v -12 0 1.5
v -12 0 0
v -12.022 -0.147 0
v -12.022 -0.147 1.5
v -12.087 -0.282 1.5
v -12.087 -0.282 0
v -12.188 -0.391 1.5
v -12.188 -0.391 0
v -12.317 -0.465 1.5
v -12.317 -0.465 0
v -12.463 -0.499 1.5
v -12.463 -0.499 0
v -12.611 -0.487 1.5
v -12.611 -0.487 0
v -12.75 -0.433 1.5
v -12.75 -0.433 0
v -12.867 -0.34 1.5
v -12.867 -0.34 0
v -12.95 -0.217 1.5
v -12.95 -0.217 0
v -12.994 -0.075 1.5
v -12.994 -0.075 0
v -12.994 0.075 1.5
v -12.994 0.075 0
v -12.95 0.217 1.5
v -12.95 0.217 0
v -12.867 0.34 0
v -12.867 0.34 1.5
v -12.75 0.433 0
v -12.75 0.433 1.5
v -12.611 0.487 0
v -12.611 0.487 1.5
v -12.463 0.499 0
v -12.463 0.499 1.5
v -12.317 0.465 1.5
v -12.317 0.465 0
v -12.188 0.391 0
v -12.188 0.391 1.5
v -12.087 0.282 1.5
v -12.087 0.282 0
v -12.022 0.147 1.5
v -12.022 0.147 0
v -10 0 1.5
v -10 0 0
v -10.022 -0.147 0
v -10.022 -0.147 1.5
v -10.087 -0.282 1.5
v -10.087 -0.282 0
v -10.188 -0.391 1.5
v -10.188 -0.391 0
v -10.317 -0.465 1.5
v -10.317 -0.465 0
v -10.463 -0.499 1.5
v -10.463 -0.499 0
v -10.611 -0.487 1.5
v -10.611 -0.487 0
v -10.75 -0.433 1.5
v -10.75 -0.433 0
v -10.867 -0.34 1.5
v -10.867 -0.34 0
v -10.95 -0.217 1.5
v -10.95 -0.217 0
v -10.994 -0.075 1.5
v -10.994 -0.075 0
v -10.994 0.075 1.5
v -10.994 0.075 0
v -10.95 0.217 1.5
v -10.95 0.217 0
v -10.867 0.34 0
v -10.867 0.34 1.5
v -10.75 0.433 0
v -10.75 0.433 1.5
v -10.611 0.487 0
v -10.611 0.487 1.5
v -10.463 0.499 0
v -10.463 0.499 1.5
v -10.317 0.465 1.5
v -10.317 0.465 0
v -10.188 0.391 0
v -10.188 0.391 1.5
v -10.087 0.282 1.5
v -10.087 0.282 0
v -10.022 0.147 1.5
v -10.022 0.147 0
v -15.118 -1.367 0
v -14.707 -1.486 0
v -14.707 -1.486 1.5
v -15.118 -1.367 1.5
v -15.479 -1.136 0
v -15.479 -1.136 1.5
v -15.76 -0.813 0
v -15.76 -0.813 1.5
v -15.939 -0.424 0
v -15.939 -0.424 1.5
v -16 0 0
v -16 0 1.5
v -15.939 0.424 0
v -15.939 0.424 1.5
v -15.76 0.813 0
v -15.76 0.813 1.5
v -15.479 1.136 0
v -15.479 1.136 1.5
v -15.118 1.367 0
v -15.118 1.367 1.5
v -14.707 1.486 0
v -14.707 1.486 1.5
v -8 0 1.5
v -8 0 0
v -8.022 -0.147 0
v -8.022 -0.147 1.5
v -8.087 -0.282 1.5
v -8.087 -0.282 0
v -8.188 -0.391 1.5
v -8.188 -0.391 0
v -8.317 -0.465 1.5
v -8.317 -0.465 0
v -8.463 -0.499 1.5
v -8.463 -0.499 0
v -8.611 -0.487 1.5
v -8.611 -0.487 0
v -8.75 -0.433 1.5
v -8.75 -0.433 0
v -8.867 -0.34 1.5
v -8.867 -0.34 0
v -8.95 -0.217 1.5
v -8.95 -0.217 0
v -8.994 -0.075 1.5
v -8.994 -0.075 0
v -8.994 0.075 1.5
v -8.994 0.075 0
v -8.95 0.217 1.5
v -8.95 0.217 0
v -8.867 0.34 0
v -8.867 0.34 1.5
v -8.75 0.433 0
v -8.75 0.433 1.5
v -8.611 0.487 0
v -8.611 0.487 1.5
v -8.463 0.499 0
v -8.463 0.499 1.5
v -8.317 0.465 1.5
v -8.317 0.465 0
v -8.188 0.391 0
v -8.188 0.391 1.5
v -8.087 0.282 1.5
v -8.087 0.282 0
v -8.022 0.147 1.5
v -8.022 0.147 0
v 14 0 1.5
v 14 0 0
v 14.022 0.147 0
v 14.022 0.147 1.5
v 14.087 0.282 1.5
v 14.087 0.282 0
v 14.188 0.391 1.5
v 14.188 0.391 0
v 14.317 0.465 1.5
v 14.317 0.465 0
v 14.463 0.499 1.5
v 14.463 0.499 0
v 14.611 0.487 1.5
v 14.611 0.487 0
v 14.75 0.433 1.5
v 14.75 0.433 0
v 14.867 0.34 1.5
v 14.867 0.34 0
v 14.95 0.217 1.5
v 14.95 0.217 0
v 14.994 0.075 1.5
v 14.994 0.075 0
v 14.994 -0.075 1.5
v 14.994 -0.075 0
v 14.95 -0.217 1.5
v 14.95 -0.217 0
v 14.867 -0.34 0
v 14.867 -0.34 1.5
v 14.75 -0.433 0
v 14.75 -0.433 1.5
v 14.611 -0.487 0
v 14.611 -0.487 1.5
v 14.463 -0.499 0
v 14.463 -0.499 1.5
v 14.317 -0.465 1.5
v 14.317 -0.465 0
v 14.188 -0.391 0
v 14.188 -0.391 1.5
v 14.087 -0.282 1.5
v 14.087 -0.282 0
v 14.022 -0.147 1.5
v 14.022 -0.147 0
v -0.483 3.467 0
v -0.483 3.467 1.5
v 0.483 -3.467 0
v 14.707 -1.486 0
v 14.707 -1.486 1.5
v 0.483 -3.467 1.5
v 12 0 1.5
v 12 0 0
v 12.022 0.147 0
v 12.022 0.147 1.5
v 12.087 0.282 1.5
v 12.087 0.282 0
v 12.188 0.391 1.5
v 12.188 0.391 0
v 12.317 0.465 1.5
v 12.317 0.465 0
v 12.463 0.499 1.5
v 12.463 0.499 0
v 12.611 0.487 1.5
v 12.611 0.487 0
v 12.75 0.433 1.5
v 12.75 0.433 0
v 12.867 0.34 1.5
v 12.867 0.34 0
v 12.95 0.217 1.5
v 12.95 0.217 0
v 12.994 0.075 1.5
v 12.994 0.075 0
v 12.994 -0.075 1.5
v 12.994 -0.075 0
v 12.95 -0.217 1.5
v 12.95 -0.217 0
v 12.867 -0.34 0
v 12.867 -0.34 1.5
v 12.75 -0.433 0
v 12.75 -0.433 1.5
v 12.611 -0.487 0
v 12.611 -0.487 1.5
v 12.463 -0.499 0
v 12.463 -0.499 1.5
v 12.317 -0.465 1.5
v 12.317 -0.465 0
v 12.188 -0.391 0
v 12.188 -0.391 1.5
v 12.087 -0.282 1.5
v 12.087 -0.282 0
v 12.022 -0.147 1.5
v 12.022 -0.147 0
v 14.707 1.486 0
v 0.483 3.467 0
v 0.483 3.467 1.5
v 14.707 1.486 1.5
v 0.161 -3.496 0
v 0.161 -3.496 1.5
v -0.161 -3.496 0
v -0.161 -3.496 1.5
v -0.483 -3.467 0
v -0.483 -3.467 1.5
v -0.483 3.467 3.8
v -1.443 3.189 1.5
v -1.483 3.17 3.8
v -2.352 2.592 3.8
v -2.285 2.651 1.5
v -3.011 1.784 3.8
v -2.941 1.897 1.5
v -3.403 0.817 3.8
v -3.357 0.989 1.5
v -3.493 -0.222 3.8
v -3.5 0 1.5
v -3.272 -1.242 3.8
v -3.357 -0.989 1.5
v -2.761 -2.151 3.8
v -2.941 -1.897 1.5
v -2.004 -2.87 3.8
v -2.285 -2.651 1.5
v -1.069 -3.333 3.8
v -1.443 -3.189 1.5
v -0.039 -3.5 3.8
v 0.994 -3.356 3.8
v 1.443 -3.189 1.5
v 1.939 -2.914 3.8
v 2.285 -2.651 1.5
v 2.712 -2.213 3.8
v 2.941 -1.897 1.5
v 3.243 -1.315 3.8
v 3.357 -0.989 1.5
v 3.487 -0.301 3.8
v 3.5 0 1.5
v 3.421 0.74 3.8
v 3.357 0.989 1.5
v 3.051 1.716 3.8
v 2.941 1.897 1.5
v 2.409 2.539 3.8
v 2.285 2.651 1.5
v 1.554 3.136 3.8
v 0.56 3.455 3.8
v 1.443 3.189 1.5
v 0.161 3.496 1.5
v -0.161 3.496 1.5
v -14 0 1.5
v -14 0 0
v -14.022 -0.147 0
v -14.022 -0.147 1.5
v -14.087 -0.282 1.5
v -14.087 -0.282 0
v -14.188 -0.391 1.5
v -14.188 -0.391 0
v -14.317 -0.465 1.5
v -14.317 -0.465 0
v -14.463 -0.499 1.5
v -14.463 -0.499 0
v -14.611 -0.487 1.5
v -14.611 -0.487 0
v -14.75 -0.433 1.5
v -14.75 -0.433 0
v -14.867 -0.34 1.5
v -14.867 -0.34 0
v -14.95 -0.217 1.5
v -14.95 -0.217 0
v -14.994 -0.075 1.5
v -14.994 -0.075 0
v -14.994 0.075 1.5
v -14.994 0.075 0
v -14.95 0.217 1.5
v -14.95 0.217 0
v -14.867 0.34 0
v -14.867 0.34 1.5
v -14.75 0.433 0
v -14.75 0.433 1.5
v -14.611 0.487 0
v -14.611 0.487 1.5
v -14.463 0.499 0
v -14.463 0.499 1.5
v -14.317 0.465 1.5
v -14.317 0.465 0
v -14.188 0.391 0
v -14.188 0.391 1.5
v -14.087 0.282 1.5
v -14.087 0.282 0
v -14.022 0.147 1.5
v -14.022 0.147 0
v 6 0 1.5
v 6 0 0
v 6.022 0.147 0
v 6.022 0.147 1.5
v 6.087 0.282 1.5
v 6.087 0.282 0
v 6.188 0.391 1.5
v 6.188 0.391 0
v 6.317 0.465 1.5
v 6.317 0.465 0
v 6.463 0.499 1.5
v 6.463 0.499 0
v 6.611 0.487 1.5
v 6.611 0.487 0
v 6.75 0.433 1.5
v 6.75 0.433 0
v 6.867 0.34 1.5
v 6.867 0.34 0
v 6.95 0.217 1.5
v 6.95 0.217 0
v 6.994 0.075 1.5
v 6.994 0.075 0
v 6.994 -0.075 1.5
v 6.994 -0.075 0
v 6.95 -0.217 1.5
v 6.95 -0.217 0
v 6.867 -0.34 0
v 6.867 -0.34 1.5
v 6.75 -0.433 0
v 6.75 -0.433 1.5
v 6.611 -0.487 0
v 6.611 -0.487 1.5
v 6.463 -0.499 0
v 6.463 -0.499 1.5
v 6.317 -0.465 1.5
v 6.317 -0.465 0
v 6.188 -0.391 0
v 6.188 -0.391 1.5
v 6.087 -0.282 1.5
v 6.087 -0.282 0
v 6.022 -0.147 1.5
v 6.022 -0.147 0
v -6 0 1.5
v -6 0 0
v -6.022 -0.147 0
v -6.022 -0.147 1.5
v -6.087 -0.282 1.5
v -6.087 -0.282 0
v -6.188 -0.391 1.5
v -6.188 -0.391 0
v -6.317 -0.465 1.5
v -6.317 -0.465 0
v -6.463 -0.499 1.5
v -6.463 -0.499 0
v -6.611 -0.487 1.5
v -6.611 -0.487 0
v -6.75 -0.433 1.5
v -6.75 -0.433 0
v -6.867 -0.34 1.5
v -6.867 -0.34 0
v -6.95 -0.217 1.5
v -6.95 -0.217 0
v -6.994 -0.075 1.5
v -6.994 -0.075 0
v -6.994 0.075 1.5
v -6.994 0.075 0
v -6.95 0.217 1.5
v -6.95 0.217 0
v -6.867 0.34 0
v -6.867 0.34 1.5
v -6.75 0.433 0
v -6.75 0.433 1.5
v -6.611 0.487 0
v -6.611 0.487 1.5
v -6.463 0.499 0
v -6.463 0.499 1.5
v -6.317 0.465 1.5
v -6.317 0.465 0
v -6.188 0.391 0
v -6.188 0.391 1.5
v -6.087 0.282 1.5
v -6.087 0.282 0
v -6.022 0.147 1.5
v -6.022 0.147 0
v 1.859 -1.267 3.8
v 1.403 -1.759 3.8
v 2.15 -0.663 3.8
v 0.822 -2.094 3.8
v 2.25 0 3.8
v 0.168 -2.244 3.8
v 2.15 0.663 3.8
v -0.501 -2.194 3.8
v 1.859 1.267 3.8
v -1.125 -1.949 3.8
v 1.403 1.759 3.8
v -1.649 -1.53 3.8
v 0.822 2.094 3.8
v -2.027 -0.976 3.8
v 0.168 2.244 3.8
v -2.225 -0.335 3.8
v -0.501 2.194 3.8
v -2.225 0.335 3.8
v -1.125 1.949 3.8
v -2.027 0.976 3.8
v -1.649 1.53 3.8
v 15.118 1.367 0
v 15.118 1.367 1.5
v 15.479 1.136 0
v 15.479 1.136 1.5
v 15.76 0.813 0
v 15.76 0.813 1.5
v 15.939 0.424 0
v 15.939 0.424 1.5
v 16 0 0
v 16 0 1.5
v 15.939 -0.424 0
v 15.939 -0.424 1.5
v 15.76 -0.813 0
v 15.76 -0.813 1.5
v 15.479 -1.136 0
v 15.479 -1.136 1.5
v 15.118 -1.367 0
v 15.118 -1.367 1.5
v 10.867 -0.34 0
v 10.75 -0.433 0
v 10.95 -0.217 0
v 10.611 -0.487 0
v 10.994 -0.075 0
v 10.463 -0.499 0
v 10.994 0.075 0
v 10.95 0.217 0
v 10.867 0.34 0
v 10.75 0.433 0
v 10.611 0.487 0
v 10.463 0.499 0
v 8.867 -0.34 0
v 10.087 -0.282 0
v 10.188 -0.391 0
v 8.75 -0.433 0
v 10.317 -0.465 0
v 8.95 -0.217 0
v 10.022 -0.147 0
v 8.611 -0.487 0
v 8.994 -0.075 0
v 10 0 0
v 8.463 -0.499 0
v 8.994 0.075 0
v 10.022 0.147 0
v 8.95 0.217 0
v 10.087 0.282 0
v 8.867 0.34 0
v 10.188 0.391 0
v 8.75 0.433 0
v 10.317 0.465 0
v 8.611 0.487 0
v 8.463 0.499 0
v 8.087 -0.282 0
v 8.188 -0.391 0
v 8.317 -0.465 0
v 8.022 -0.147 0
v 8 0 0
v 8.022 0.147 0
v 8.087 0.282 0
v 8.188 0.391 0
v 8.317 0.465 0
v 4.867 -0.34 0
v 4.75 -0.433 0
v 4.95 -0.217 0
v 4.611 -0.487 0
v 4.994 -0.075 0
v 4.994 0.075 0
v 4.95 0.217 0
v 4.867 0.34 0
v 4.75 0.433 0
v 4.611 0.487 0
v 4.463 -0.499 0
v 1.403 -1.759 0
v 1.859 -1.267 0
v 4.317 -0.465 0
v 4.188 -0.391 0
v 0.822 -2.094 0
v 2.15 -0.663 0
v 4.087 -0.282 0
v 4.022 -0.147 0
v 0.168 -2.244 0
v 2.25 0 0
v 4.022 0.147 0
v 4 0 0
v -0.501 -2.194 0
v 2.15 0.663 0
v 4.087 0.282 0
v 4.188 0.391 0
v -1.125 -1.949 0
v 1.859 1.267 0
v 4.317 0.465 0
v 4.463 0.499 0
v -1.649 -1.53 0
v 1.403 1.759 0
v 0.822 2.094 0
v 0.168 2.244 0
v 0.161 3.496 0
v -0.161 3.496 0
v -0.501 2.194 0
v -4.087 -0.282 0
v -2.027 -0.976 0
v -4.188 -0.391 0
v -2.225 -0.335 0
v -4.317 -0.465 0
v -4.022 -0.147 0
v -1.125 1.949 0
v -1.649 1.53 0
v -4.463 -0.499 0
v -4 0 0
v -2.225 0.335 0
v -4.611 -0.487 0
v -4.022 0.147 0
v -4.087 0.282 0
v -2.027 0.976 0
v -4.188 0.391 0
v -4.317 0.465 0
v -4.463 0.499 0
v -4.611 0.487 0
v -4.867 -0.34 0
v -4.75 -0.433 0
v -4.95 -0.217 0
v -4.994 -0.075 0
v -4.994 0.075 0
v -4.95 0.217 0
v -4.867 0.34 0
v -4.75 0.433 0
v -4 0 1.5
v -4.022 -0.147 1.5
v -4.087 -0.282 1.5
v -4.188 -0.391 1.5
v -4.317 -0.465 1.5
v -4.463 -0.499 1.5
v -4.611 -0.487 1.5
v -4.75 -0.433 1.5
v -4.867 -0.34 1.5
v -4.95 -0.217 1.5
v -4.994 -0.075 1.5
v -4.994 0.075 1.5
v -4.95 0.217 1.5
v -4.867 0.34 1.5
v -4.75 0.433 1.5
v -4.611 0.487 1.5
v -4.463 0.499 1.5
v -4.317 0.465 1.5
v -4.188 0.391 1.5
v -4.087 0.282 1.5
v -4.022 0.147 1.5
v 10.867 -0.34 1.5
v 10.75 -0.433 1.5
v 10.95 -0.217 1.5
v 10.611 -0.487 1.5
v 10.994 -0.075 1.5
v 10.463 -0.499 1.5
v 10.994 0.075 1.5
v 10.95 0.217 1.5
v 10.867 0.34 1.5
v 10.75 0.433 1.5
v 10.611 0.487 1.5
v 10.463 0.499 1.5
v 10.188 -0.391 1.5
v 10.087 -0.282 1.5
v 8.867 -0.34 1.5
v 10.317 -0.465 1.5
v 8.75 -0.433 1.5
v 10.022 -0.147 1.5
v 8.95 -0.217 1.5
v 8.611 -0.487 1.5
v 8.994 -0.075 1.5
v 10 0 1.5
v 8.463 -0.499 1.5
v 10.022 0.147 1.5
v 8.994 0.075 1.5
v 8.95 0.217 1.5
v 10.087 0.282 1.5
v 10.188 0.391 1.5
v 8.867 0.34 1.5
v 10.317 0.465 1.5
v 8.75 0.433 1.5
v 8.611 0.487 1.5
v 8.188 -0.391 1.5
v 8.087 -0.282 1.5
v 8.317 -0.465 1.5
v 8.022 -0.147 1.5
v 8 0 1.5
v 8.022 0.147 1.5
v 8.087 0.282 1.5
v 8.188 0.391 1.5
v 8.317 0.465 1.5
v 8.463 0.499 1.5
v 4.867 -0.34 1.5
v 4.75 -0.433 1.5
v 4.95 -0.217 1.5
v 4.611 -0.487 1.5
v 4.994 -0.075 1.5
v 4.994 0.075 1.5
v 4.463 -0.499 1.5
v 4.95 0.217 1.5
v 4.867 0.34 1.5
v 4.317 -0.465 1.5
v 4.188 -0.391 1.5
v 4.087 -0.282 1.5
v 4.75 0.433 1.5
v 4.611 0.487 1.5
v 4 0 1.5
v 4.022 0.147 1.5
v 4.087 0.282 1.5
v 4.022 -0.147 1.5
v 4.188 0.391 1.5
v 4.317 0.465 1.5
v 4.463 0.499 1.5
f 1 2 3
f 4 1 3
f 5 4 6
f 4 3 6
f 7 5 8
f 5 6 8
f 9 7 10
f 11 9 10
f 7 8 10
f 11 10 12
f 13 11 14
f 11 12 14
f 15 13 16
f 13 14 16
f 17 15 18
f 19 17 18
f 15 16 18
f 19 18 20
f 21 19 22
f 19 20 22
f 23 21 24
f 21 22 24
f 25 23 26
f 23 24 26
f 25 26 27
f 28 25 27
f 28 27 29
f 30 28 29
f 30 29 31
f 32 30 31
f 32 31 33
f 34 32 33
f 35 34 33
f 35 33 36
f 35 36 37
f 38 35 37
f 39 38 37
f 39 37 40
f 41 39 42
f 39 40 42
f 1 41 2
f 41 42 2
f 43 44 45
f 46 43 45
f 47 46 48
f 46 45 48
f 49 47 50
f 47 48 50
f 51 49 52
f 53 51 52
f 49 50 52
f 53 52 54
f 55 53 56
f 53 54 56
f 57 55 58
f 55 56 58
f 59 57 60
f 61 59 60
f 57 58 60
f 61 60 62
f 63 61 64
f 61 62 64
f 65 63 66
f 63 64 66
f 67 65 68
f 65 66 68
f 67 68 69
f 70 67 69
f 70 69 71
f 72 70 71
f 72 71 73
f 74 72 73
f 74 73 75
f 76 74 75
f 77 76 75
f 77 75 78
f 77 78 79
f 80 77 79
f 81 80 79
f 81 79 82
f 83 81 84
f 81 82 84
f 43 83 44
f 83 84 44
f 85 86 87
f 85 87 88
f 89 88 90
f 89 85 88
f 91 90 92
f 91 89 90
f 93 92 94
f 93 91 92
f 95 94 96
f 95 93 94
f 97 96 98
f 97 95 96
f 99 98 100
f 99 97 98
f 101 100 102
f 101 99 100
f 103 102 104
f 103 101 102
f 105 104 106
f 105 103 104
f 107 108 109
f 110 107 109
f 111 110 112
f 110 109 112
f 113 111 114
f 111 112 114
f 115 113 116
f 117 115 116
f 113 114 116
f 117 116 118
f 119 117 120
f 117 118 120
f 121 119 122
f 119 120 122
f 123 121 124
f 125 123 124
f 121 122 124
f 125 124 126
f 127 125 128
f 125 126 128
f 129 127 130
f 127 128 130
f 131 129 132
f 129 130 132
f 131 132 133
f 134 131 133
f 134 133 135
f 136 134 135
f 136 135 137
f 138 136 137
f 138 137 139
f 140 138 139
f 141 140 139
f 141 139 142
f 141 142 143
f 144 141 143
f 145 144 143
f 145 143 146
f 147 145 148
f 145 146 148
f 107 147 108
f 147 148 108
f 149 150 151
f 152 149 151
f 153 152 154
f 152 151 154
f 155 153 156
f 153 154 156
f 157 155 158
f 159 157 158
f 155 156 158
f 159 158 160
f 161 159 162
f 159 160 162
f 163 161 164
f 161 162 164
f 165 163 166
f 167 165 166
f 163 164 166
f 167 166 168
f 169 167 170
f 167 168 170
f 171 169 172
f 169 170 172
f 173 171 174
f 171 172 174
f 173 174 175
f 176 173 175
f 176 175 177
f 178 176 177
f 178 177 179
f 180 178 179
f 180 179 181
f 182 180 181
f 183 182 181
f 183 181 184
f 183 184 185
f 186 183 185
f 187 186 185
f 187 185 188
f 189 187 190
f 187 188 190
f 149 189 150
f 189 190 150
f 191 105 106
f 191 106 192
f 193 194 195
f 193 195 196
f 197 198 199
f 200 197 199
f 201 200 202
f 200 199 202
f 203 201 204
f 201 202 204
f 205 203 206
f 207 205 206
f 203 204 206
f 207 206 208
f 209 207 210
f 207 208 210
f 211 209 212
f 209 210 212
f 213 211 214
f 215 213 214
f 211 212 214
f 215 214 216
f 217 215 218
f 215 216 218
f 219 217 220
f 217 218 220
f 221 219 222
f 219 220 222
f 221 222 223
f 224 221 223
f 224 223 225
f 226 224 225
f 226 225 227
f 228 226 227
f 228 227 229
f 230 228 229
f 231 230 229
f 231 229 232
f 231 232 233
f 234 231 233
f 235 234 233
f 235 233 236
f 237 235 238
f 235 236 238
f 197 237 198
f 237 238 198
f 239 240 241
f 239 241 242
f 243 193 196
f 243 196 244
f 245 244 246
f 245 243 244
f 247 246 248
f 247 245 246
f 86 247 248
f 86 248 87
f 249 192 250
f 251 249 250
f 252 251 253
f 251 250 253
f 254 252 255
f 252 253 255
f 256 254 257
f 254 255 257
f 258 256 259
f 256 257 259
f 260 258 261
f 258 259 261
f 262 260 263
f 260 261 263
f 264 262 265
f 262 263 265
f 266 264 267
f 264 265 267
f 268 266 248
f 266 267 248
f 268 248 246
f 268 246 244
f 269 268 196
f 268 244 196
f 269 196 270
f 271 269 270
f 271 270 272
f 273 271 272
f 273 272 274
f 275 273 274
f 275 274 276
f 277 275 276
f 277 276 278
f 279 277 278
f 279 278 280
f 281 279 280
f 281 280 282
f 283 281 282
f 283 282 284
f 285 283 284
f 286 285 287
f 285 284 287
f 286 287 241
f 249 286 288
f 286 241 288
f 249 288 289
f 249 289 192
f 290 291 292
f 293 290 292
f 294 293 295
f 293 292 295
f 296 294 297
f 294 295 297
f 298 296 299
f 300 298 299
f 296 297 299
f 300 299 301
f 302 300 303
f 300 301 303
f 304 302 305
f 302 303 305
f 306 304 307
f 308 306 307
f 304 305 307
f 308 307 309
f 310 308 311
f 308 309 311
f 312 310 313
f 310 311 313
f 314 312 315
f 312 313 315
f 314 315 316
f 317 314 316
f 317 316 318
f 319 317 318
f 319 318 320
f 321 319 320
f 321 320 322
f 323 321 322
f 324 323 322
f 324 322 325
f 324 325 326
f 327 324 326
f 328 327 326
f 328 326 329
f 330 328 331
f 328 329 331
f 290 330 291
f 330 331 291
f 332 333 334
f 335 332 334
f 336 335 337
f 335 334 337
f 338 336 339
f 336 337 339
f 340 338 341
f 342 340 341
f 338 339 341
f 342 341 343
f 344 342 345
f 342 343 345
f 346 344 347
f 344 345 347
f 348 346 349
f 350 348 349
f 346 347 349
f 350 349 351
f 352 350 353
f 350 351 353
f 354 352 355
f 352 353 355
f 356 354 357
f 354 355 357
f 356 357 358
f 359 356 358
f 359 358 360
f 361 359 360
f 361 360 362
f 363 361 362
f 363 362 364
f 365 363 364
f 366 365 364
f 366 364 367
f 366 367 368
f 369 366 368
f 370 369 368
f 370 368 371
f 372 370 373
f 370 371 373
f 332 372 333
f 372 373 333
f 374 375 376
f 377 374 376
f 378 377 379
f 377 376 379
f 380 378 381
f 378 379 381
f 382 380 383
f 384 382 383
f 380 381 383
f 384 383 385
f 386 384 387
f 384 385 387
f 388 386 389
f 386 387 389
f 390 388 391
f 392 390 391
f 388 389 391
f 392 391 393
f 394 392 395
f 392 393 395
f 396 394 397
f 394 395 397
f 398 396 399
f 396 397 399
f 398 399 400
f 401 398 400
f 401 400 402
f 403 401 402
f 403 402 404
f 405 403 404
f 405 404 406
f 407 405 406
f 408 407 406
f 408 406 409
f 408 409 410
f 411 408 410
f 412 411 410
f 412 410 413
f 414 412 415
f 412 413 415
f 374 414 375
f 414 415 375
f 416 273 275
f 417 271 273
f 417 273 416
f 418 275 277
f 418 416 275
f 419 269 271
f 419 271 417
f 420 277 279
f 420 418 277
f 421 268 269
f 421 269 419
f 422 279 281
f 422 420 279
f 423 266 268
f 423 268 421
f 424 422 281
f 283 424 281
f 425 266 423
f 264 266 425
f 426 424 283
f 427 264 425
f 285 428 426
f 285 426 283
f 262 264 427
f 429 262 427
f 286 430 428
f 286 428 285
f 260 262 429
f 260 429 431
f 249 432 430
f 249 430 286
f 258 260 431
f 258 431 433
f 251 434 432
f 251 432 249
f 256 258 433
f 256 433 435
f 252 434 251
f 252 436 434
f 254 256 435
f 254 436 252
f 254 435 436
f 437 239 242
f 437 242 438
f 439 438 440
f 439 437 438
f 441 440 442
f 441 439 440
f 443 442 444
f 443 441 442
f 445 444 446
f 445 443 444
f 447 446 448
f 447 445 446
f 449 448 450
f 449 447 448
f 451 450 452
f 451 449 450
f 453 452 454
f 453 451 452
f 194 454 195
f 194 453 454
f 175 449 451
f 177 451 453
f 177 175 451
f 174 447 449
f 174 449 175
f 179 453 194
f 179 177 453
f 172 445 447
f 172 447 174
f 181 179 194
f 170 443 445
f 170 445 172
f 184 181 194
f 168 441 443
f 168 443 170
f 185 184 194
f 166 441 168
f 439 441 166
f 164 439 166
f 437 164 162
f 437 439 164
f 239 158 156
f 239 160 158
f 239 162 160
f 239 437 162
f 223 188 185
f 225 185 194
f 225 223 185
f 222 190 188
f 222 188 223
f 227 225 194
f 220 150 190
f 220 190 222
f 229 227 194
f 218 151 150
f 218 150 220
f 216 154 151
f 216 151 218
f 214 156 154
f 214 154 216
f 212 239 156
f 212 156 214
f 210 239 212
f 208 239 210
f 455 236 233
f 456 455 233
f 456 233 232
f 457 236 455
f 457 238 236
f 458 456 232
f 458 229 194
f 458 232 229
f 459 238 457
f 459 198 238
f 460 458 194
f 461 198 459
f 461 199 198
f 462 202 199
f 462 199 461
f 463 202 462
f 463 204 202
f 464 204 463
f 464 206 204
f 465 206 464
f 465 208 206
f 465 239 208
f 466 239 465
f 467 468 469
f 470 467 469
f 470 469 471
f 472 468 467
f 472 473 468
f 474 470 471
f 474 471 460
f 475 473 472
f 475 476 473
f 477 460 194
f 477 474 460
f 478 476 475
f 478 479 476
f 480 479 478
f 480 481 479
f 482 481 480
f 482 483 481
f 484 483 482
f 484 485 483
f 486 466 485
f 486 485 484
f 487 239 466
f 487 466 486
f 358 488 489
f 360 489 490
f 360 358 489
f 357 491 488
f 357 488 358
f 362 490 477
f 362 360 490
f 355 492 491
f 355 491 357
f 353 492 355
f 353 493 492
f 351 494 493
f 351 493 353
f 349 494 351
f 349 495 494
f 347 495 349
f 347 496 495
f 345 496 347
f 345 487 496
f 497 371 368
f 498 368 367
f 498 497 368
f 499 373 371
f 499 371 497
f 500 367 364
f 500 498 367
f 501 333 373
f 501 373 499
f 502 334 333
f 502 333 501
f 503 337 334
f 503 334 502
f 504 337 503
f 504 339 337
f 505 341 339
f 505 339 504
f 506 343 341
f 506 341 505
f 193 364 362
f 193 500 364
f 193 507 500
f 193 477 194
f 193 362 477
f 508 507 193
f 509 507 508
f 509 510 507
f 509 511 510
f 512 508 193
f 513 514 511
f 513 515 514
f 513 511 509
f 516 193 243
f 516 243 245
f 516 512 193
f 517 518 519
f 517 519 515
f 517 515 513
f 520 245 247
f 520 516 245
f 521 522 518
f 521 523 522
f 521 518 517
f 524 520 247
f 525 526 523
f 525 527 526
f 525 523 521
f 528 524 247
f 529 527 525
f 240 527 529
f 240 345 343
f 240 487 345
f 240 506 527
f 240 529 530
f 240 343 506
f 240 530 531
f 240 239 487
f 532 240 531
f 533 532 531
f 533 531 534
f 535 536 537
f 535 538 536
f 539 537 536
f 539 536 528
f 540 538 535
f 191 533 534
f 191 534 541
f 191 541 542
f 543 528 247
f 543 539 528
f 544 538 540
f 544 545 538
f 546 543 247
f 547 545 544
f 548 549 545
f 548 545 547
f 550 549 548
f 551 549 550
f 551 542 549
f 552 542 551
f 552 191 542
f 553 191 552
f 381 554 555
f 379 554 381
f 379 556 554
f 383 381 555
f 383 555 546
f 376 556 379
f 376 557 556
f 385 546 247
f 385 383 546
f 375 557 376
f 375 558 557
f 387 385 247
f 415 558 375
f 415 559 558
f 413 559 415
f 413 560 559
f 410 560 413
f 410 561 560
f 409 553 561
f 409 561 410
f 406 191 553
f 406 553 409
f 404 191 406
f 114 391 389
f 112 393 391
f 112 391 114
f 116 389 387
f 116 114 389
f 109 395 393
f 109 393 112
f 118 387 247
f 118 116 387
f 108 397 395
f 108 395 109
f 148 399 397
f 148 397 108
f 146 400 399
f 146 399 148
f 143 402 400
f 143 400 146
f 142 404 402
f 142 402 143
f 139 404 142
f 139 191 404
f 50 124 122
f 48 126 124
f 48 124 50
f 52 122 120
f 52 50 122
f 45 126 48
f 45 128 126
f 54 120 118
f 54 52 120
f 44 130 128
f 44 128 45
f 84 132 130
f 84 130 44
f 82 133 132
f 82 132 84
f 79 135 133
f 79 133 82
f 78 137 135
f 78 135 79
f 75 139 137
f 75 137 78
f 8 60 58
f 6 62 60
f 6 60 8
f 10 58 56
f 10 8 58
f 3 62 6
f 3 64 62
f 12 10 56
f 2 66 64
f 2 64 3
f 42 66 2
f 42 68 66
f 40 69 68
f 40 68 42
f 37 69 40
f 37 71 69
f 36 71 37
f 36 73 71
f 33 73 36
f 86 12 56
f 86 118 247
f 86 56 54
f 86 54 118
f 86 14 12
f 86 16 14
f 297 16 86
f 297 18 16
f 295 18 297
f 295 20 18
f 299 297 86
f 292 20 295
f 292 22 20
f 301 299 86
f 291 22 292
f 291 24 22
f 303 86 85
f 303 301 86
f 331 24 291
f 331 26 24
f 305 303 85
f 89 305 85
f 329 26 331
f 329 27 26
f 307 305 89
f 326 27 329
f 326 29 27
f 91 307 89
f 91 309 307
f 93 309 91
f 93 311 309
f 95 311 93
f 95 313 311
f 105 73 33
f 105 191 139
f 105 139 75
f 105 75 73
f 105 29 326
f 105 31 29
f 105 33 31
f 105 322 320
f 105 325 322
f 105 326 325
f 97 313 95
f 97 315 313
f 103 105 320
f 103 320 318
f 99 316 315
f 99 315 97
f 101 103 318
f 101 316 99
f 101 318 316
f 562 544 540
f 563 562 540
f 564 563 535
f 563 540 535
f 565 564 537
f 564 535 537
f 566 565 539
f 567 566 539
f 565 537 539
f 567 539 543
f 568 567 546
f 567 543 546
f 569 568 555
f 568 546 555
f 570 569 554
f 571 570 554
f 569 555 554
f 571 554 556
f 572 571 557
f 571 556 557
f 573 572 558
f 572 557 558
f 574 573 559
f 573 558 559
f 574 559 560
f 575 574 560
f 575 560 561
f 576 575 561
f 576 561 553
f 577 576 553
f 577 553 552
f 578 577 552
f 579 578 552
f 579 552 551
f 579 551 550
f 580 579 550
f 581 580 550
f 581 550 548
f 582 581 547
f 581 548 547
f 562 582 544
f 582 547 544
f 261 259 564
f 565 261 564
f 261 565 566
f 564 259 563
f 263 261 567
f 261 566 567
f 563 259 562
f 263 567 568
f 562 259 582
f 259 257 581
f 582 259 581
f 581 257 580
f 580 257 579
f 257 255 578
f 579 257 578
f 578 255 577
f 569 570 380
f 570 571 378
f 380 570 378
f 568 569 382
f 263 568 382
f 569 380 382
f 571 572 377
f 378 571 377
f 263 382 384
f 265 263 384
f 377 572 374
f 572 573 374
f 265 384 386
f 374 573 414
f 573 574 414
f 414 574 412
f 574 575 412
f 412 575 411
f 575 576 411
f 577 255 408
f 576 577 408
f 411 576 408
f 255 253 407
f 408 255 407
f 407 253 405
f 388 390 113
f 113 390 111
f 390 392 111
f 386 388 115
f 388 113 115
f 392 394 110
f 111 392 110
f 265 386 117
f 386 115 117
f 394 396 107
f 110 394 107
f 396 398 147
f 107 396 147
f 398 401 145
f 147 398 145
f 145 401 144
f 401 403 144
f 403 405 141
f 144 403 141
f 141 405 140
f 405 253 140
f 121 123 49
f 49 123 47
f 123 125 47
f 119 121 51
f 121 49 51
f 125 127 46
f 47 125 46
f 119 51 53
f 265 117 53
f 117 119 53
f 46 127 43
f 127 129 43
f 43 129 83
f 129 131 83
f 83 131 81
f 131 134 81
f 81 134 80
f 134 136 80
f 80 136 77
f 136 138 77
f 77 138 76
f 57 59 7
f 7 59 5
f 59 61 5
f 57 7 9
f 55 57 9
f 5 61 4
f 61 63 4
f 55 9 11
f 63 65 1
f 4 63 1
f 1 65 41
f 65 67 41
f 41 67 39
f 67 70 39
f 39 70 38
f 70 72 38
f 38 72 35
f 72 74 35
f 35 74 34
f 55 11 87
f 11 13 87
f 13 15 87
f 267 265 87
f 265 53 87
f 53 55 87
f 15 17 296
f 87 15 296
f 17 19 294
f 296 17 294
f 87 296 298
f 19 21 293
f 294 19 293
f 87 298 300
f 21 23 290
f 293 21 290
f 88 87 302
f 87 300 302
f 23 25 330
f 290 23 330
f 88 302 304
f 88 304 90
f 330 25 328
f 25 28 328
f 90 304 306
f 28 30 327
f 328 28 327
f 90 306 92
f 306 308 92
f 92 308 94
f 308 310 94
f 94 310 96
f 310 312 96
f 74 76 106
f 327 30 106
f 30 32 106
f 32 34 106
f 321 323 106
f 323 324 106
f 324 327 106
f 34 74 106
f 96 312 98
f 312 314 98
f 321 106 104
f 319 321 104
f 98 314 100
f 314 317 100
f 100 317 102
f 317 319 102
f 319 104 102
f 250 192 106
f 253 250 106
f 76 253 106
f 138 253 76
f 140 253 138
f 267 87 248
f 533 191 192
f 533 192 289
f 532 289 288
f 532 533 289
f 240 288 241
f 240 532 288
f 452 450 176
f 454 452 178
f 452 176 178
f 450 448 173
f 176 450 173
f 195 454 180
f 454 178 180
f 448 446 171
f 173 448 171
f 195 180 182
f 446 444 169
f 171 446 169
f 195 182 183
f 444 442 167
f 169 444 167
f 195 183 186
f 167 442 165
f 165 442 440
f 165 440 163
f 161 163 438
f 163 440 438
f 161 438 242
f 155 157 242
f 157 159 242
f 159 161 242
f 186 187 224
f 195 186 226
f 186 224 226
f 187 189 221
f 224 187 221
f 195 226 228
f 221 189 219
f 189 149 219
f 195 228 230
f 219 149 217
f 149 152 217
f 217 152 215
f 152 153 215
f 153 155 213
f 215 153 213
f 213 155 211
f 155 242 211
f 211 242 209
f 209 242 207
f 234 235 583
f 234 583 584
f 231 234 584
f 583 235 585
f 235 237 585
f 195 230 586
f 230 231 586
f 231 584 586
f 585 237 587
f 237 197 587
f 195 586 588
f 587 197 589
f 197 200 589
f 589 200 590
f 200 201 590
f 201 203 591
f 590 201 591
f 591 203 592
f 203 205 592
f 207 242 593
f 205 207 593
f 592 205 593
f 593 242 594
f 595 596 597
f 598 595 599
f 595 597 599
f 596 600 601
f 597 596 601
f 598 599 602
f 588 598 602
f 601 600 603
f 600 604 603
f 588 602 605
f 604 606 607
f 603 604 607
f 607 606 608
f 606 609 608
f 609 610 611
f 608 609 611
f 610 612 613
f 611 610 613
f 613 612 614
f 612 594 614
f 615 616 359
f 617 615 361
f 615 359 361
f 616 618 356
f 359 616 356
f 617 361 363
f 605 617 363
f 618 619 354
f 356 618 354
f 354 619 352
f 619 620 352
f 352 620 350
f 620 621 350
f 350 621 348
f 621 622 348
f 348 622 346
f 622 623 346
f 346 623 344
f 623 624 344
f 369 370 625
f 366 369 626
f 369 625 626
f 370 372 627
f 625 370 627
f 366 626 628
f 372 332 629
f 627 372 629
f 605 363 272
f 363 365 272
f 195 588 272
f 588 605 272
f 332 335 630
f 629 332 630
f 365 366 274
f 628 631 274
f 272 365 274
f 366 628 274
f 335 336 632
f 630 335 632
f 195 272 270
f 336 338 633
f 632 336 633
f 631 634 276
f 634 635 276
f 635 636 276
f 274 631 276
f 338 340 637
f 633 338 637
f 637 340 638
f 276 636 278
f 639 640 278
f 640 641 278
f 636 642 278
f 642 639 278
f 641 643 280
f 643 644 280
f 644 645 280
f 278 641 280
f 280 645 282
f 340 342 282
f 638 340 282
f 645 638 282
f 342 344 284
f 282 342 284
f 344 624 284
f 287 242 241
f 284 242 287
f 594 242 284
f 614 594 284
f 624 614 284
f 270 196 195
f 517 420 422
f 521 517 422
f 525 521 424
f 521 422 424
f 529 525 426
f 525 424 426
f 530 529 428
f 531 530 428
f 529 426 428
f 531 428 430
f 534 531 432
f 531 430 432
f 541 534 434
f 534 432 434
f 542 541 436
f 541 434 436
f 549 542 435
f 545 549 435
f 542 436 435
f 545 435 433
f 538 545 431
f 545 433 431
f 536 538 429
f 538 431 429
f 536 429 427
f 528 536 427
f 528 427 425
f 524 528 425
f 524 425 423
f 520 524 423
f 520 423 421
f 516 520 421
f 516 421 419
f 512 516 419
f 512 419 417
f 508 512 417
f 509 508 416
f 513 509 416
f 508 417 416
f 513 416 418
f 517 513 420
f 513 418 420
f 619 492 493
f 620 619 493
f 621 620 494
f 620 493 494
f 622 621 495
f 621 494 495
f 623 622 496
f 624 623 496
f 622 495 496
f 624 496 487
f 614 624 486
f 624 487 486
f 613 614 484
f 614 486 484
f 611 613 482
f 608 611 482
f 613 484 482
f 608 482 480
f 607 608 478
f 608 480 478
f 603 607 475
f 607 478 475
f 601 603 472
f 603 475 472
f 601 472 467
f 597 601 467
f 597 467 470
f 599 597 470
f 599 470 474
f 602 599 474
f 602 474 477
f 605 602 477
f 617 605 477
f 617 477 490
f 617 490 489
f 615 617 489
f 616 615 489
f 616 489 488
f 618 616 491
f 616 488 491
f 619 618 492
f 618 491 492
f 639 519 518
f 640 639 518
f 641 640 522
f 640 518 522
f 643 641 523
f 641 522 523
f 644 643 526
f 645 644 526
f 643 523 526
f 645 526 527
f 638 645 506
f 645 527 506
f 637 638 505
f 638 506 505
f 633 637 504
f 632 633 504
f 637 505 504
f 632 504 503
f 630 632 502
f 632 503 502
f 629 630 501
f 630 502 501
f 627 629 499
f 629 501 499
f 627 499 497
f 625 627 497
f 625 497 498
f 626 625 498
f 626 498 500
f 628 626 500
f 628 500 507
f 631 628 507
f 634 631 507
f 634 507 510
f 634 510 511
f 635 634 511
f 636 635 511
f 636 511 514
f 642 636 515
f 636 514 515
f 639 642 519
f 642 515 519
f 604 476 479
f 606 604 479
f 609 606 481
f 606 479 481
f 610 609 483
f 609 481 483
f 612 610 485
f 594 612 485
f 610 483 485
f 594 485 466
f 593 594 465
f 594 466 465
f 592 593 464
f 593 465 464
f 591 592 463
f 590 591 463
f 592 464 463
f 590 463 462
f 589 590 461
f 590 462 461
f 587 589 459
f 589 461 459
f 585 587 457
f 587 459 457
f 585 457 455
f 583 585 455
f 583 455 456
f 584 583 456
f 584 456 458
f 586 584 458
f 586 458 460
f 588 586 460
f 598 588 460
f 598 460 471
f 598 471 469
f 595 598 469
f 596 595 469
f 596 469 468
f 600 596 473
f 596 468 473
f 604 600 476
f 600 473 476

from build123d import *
from build123d.topology import SkipClean

# Parameters (mm, degrees)
EXTRUDE_1_DEPTH     = 1.5
SKETCH_2_R          = 3.5
EXTRUDE_2_DEPTH     = 2.3
SKETCH_3_R          = 2.25
CUT_EXTRUDE_1_DEPTH = 3.8
SKETCH_5_R          = 0.5
CUT_EXTRUDE_2_DEPTH = 1.5


with BuildPart() as part:
    # 草图1 → 凸台-拉伸1 (new body)
    with BuildSketch(Plane.XY):
        with BuildLine():
            Line((-14.706896552, 1.485662753), (-0.482758621, 3.466546425))
            ThreePointArc((-0.482758621, 3.466546425), (0, 3.5), (0.482758621, 3.466546425))
            Line((0.482758621, 3.466546425), (14.706896552, 1.485662753))
            ThreePointArc((14.706896552, 1.485662753), (16, 0), (14.706896552, -1.485662753))
            Line((14.706896552, -1.485662753), (0.482758621, -3.466546425))
            ThreePointArc((0.482758621, -3.466546425), (0, -3.5), (-0.482758621, -3.466546425))
            Line((-0.482758621, -3.466546425), (-14.706896552, -1.485662753))
            ThreePointArc((-14.706896552, -1.485662753), (-16, 0), (-14.706896552, 1.485662753))
        make_face()
    extrude(amount=EXTRUDE_1_DEPTH)

    # 草图2 → 凸台-拉伸2 (add)
    with SkipClean():  # the faces are left unmerged after this step: merging them gives an invalid solid
        with BuildSketch(Plane.XY.offset(1.5)):
            with Locations(Location((0, 0, 0), (0, 0, 97.928141766))):
                Circle(SKETCH_2_R)
        extrude(amount=EXTRUDE_2_DEPTH)
    add(part.part.scale(1), mode=Mode.REPLACE)  # the faces are merged on a copy

    # 草图3 → 切除-拉伸1 (cut)
    with BuildSketch(Plane.XY.offset(3.8)):
        Circle(SKETCH_3_R)
    extrude(amount=-CUT_EXTRUDE_1_DEPTH, mode=Mode.SUBTRACT)

    # 草图5 → 切除-拉伸2 (cut)
    with BuildSketch(Plane(origin=(0, 0, 0), x_dir=(-1, 0, 0), z_dir=(0, 0, -1))):
        with Locations((-4.5, 0)):
            Circle(SKETCH_5_R)
        with Locations((-6.5, 0)):
            Circle(SKETCH_5_R)
        with Locations((-8.5, 0)):
            Circle(SKETCH_5_R)
        with Locations((-10.5, 0)):
            Circle(SKETCH_5_R)
        with Locations((-12.5, 0)):
            Circle(SKETCH_5_R)
        with Locations((-14.5, 0)):
            Circle(SKETCH_5_R)
        with Locations(Location((4.5, 0, 0), (0, 0, 180))):
            Circle(SKETCH_5_R)
        with Locations(Location((14.5, 0, 0), (0, 0, 180))):
            Circle(SKETCH_5_R)
        with Locations(Location((12.5, 0, 0), (0, 0, 180))):
            Circle(SKETCH_5_R)
        with Locations(Location((10.5, 0, 0), (0, 0, 180))):
            Circle(SKETCH_5_R)
        with Locations(Location((8.5, 0, 0), (0, 0, 180))):
            Circle(SKETCH_5_R)
        with Locations(Location((6.5, 0, 0), (0, 0, 180))):
            Circle(SKETCH_5_R)
    extrude(amount=-CUT_EXTRUDE_2_DEPTH, mode=Mode.SUBTRACT)


solid = part.part
